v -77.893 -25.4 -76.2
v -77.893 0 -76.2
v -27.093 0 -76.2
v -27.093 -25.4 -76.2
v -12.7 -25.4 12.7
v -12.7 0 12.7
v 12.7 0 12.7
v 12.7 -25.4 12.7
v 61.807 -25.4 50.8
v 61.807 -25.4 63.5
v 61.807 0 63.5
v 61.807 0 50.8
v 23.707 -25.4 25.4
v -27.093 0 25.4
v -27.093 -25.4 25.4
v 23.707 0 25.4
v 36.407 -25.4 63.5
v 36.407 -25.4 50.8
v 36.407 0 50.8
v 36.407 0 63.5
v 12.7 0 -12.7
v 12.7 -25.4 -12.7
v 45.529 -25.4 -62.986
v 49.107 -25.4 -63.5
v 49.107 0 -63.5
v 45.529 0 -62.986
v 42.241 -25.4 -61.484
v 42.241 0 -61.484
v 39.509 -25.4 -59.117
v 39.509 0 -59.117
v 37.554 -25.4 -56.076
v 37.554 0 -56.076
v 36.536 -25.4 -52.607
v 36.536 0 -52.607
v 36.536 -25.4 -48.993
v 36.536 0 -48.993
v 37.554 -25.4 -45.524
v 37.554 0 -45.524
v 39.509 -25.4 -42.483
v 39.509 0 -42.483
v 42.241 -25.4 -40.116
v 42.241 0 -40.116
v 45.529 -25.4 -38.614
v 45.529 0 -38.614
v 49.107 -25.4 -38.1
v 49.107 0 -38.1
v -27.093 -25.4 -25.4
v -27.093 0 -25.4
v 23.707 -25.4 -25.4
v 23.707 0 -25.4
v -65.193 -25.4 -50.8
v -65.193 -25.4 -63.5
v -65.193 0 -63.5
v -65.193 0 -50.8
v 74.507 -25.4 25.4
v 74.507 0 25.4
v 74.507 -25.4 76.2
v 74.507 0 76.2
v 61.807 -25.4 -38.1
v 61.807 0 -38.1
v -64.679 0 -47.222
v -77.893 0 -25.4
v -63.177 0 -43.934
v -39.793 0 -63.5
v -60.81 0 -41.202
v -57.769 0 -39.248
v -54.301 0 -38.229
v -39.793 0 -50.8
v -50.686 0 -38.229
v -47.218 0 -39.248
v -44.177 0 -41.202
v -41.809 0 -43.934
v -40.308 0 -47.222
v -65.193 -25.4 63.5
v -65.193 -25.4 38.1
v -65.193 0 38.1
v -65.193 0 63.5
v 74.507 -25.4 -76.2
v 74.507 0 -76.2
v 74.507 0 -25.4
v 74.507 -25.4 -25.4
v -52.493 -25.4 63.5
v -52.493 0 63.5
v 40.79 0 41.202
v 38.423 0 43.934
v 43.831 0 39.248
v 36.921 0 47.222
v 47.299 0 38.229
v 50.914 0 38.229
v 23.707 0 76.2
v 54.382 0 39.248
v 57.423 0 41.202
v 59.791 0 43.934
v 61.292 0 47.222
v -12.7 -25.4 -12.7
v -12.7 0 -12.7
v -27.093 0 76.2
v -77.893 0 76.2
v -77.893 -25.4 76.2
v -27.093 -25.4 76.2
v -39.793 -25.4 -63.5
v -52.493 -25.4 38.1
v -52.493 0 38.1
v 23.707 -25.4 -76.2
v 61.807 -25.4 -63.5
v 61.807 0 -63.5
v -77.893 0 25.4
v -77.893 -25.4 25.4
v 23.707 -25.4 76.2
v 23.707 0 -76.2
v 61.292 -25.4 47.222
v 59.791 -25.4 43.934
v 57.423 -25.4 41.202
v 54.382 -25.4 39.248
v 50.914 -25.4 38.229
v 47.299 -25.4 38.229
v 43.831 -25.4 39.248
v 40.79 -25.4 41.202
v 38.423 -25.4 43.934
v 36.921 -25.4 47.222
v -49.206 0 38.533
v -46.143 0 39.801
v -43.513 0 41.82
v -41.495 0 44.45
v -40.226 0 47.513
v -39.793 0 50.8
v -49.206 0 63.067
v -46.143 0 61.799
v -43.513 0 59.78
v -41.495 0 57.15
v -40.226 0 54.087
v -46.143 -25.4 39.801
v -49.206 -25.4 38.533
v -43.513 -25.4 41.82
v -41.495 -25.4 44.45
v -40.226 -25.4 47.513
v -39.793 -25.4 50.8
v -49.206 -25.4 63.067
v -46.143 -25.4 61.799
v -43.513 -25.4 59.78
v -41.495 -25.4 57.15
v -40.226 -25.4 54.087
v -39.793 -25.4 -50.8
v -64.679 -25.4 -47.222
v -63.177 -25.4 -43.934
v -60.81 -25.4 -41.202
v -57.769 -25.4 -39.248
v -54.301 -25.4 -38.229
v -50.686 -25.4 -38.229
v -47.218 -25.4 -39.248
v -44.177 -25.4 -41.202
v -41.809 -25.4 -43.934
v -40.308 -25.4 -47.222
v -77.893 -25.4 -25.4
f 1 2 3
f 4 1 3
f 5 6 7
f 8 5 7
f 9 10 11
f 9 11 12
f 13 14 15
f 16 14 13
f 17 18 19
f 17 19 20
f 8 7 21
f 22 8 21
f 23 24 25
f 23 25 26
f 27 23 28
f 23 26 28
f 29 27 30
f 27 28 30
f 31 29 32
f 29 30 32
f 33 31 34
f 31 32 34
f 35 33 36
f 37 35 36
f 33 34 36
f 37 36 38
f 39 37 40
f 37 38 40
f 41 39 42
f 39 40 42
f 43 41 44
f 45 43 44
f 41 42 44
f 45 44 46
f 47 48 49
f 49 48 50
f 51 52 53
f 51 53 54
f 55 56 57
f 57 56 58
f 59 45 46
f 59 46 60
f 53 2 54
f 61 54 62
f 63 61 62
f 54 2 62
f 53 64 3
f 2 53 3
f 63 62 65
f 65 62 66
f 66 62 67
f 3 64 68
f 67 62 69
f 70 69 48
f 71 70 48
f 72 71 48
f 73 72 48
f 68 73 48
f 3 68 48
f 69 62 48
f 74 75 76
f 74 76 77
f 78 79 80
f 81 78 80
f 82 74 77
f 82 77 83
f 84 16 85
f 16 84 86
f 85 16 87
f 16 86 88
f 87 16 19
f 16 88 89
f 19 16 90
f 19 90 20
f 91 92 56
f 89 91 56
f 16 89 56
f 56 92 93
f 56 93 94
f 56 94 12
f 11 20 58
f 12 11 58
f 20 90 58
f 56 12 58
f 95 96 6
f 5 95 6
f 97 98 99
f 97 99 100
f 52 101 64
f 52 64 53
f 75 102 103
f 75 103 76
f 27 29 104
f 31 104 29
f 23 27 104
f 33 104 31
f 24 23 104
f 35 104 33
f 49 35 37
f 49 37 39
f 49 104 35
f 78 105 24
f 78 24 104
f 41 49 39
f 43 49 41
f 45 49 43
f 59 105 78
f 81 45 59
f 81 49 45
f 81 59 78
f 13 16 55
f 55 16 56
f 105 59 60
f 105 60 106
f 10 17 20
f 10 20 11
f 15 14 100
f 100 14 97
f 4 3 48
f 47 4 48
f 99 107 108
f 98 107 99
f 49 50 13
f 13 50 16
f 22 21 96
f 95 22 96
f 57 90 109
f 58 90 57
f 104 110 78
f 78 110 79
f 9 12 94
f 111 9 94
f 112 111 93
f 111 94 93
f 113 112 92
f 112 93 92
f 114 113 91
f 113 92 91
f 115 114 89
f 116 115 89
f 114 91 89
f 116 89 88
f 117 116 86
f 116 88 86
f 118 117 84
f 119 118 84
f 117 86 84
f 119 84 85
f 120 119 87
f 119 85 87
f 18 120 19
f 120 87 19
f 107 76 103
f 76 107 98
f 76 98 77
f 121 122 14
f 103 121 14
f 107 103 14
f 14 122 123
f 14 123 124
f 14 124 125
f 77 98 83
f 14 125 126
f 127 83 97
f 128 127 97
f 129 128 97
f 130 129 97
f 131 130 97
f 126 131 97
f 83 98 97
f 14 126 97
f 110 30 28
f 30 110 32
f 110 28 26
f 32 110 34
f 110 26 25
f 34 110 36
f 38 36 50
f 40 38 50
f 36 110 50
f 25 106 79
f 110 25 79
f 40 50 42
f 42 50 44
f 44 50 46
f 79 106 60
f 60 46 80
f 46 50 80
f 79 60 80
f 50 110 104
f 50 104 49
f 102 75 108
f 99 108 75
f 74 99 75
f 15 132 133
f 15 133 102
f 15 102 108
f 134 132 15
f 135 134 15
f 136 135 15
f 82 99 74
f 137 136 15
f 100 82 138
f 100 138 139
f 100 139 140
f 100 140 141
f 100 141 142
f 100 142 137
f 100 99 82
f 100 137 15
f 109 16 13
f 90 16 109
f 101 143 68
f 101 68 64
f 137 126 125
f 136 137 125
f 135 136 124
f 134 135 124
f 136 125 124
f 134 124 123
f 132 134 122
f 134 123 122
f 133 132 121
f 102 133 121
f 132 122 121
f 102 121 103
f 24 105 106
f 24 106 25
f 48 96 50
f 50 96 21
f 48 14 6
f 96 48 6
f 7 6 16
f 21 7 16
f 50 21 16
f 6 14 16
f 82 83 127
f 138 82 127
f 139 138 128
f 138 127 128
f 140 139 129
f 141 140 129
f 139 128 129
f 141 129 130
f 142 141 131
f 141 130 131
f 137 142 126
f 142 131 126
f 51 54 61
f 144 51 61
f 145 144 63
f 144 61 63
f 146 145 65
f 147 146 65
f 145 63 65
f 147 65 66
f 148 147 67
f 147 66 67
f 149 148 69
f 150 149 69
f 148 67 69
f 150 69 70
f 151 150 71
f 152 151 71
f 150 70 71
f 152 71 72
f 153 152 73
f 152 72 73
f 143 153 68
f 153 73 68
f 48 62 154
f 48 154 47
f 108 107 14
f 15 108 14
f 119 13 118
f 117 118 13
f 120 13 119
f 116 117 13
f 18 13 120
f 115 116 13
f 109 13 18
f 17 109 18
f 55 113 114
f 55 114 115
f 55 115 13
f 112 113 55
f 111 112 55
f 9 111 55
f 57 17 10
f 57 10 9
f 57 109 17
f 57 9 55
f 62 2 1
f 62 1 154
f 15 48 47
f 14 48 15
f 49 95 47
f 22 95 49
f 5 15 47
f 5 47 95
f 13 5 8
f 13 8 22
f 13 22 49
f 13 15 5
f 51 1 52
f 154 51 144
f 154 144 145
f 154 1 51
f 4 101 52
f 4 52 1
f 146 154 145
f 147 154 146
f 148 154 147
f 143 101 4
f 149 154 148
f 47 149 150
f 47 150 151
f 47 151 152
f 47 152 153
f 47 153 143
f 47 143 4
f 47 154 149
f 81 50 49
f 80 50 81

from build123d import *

# Parameters (mm, degrees)
F0_W     = 50.8
F0_H     = 50.8
F1_DEPTH = 25.4


with BuildPart() as f1:
    # F0 (on Front) → F1 (new body)
    with BuildSketch(Plane.XZ):
        with Locations((-1.693333, 0)):
            Rectangle(F0_W, F0_H)
        Polygon((-12.7, 0), (-12.7, 12.7), (0, 12.7), (12.7, 12.7), (12.7, 0), (12.7, -12.7), (0, -12.7), (-12.7, -12.7), align=None, mode=Mode.SUBTRACT)
        with Locations((49.106667, -50.8)):
            Rectangle(F0_W, F0_H)
        with BuildLine():
            ThreePointArc((49.106667, -63.5), (36.406667, -50.8), (49.106667, -38.1))
            Line((49.106667, -38.1), (61.806667, -38.1))
            Line((61.806667, -38.1), (61.806667, -50.8))
            Line((61.806667, -50.8), (61.806667, -63.5))
            Line((61.806667, -63.5), (49.106667, -63.5))
        make_face(mode=Mode.SUBTRACT)
        with Locations((-52.493333, -50.8)):
            Rectangle(F0_W, F0_H)
        with BuildLine():
            Line((-39.793333, -50.8), (-39.793333, -63.5))
            Line((-39.793333, -63.5), (-52.493333, -63.5))
            Line((-52.493333, -63.5), (-65.193333, -63.5))
            Line((-65.193333, -63.5), (-65.193333, -50.8))
            ThreePointArc((-65.193333, -50.8), (-52.493333, -38.1), (-39.793333, -50.8))
        make_face(mode=Mode.SUBTRACT)
        with Locations((-52.493333, 50.8)):
            Rectangle(F0_W, F0_H)
        with BuildLine():
            ThreePointArc((-39.793333, 50.8), (-43.513077, 41.819744), (-52.493333, 38.1))
            Line((-52.493333, 38.1), (-65.193333, 38.1))
            Line((-65.193333, 38.1), (-65.193333, 50.8))
            Line((-65.193333, 50.8), (-65.193333, 63.5))
            Line((-65.193333, 63.5), (-52.493333, 63.5))
            ThreePointArc((-52.493333, 63.5), (-43.513077, 59.780256), (-39.793333, 50.8))
        make_face(mode=Mode.SUBTRACT)
        with Locations((49.106667, 50.8)):
            Rectangle(F0_W, F0_H)
        with BuildLine():
            Line((49.106667, 63.5), (61.806667, 63.5))
            Line((61.806667, 63.5), (61.806667, 50.8))
            ThreePointArc((61.806667, 50.8), (49.106667, 38.1), (36.406667, 50.8))
            Line((36.406667, 50.8), (36.406667, 63.5))
            Line((36.406667, 63.5), (49.106667, 63.5))
        make_face(mode=Mode.SUBTRACT)
    extrude(amount=F1_DEPTH)


solid = f1.part
